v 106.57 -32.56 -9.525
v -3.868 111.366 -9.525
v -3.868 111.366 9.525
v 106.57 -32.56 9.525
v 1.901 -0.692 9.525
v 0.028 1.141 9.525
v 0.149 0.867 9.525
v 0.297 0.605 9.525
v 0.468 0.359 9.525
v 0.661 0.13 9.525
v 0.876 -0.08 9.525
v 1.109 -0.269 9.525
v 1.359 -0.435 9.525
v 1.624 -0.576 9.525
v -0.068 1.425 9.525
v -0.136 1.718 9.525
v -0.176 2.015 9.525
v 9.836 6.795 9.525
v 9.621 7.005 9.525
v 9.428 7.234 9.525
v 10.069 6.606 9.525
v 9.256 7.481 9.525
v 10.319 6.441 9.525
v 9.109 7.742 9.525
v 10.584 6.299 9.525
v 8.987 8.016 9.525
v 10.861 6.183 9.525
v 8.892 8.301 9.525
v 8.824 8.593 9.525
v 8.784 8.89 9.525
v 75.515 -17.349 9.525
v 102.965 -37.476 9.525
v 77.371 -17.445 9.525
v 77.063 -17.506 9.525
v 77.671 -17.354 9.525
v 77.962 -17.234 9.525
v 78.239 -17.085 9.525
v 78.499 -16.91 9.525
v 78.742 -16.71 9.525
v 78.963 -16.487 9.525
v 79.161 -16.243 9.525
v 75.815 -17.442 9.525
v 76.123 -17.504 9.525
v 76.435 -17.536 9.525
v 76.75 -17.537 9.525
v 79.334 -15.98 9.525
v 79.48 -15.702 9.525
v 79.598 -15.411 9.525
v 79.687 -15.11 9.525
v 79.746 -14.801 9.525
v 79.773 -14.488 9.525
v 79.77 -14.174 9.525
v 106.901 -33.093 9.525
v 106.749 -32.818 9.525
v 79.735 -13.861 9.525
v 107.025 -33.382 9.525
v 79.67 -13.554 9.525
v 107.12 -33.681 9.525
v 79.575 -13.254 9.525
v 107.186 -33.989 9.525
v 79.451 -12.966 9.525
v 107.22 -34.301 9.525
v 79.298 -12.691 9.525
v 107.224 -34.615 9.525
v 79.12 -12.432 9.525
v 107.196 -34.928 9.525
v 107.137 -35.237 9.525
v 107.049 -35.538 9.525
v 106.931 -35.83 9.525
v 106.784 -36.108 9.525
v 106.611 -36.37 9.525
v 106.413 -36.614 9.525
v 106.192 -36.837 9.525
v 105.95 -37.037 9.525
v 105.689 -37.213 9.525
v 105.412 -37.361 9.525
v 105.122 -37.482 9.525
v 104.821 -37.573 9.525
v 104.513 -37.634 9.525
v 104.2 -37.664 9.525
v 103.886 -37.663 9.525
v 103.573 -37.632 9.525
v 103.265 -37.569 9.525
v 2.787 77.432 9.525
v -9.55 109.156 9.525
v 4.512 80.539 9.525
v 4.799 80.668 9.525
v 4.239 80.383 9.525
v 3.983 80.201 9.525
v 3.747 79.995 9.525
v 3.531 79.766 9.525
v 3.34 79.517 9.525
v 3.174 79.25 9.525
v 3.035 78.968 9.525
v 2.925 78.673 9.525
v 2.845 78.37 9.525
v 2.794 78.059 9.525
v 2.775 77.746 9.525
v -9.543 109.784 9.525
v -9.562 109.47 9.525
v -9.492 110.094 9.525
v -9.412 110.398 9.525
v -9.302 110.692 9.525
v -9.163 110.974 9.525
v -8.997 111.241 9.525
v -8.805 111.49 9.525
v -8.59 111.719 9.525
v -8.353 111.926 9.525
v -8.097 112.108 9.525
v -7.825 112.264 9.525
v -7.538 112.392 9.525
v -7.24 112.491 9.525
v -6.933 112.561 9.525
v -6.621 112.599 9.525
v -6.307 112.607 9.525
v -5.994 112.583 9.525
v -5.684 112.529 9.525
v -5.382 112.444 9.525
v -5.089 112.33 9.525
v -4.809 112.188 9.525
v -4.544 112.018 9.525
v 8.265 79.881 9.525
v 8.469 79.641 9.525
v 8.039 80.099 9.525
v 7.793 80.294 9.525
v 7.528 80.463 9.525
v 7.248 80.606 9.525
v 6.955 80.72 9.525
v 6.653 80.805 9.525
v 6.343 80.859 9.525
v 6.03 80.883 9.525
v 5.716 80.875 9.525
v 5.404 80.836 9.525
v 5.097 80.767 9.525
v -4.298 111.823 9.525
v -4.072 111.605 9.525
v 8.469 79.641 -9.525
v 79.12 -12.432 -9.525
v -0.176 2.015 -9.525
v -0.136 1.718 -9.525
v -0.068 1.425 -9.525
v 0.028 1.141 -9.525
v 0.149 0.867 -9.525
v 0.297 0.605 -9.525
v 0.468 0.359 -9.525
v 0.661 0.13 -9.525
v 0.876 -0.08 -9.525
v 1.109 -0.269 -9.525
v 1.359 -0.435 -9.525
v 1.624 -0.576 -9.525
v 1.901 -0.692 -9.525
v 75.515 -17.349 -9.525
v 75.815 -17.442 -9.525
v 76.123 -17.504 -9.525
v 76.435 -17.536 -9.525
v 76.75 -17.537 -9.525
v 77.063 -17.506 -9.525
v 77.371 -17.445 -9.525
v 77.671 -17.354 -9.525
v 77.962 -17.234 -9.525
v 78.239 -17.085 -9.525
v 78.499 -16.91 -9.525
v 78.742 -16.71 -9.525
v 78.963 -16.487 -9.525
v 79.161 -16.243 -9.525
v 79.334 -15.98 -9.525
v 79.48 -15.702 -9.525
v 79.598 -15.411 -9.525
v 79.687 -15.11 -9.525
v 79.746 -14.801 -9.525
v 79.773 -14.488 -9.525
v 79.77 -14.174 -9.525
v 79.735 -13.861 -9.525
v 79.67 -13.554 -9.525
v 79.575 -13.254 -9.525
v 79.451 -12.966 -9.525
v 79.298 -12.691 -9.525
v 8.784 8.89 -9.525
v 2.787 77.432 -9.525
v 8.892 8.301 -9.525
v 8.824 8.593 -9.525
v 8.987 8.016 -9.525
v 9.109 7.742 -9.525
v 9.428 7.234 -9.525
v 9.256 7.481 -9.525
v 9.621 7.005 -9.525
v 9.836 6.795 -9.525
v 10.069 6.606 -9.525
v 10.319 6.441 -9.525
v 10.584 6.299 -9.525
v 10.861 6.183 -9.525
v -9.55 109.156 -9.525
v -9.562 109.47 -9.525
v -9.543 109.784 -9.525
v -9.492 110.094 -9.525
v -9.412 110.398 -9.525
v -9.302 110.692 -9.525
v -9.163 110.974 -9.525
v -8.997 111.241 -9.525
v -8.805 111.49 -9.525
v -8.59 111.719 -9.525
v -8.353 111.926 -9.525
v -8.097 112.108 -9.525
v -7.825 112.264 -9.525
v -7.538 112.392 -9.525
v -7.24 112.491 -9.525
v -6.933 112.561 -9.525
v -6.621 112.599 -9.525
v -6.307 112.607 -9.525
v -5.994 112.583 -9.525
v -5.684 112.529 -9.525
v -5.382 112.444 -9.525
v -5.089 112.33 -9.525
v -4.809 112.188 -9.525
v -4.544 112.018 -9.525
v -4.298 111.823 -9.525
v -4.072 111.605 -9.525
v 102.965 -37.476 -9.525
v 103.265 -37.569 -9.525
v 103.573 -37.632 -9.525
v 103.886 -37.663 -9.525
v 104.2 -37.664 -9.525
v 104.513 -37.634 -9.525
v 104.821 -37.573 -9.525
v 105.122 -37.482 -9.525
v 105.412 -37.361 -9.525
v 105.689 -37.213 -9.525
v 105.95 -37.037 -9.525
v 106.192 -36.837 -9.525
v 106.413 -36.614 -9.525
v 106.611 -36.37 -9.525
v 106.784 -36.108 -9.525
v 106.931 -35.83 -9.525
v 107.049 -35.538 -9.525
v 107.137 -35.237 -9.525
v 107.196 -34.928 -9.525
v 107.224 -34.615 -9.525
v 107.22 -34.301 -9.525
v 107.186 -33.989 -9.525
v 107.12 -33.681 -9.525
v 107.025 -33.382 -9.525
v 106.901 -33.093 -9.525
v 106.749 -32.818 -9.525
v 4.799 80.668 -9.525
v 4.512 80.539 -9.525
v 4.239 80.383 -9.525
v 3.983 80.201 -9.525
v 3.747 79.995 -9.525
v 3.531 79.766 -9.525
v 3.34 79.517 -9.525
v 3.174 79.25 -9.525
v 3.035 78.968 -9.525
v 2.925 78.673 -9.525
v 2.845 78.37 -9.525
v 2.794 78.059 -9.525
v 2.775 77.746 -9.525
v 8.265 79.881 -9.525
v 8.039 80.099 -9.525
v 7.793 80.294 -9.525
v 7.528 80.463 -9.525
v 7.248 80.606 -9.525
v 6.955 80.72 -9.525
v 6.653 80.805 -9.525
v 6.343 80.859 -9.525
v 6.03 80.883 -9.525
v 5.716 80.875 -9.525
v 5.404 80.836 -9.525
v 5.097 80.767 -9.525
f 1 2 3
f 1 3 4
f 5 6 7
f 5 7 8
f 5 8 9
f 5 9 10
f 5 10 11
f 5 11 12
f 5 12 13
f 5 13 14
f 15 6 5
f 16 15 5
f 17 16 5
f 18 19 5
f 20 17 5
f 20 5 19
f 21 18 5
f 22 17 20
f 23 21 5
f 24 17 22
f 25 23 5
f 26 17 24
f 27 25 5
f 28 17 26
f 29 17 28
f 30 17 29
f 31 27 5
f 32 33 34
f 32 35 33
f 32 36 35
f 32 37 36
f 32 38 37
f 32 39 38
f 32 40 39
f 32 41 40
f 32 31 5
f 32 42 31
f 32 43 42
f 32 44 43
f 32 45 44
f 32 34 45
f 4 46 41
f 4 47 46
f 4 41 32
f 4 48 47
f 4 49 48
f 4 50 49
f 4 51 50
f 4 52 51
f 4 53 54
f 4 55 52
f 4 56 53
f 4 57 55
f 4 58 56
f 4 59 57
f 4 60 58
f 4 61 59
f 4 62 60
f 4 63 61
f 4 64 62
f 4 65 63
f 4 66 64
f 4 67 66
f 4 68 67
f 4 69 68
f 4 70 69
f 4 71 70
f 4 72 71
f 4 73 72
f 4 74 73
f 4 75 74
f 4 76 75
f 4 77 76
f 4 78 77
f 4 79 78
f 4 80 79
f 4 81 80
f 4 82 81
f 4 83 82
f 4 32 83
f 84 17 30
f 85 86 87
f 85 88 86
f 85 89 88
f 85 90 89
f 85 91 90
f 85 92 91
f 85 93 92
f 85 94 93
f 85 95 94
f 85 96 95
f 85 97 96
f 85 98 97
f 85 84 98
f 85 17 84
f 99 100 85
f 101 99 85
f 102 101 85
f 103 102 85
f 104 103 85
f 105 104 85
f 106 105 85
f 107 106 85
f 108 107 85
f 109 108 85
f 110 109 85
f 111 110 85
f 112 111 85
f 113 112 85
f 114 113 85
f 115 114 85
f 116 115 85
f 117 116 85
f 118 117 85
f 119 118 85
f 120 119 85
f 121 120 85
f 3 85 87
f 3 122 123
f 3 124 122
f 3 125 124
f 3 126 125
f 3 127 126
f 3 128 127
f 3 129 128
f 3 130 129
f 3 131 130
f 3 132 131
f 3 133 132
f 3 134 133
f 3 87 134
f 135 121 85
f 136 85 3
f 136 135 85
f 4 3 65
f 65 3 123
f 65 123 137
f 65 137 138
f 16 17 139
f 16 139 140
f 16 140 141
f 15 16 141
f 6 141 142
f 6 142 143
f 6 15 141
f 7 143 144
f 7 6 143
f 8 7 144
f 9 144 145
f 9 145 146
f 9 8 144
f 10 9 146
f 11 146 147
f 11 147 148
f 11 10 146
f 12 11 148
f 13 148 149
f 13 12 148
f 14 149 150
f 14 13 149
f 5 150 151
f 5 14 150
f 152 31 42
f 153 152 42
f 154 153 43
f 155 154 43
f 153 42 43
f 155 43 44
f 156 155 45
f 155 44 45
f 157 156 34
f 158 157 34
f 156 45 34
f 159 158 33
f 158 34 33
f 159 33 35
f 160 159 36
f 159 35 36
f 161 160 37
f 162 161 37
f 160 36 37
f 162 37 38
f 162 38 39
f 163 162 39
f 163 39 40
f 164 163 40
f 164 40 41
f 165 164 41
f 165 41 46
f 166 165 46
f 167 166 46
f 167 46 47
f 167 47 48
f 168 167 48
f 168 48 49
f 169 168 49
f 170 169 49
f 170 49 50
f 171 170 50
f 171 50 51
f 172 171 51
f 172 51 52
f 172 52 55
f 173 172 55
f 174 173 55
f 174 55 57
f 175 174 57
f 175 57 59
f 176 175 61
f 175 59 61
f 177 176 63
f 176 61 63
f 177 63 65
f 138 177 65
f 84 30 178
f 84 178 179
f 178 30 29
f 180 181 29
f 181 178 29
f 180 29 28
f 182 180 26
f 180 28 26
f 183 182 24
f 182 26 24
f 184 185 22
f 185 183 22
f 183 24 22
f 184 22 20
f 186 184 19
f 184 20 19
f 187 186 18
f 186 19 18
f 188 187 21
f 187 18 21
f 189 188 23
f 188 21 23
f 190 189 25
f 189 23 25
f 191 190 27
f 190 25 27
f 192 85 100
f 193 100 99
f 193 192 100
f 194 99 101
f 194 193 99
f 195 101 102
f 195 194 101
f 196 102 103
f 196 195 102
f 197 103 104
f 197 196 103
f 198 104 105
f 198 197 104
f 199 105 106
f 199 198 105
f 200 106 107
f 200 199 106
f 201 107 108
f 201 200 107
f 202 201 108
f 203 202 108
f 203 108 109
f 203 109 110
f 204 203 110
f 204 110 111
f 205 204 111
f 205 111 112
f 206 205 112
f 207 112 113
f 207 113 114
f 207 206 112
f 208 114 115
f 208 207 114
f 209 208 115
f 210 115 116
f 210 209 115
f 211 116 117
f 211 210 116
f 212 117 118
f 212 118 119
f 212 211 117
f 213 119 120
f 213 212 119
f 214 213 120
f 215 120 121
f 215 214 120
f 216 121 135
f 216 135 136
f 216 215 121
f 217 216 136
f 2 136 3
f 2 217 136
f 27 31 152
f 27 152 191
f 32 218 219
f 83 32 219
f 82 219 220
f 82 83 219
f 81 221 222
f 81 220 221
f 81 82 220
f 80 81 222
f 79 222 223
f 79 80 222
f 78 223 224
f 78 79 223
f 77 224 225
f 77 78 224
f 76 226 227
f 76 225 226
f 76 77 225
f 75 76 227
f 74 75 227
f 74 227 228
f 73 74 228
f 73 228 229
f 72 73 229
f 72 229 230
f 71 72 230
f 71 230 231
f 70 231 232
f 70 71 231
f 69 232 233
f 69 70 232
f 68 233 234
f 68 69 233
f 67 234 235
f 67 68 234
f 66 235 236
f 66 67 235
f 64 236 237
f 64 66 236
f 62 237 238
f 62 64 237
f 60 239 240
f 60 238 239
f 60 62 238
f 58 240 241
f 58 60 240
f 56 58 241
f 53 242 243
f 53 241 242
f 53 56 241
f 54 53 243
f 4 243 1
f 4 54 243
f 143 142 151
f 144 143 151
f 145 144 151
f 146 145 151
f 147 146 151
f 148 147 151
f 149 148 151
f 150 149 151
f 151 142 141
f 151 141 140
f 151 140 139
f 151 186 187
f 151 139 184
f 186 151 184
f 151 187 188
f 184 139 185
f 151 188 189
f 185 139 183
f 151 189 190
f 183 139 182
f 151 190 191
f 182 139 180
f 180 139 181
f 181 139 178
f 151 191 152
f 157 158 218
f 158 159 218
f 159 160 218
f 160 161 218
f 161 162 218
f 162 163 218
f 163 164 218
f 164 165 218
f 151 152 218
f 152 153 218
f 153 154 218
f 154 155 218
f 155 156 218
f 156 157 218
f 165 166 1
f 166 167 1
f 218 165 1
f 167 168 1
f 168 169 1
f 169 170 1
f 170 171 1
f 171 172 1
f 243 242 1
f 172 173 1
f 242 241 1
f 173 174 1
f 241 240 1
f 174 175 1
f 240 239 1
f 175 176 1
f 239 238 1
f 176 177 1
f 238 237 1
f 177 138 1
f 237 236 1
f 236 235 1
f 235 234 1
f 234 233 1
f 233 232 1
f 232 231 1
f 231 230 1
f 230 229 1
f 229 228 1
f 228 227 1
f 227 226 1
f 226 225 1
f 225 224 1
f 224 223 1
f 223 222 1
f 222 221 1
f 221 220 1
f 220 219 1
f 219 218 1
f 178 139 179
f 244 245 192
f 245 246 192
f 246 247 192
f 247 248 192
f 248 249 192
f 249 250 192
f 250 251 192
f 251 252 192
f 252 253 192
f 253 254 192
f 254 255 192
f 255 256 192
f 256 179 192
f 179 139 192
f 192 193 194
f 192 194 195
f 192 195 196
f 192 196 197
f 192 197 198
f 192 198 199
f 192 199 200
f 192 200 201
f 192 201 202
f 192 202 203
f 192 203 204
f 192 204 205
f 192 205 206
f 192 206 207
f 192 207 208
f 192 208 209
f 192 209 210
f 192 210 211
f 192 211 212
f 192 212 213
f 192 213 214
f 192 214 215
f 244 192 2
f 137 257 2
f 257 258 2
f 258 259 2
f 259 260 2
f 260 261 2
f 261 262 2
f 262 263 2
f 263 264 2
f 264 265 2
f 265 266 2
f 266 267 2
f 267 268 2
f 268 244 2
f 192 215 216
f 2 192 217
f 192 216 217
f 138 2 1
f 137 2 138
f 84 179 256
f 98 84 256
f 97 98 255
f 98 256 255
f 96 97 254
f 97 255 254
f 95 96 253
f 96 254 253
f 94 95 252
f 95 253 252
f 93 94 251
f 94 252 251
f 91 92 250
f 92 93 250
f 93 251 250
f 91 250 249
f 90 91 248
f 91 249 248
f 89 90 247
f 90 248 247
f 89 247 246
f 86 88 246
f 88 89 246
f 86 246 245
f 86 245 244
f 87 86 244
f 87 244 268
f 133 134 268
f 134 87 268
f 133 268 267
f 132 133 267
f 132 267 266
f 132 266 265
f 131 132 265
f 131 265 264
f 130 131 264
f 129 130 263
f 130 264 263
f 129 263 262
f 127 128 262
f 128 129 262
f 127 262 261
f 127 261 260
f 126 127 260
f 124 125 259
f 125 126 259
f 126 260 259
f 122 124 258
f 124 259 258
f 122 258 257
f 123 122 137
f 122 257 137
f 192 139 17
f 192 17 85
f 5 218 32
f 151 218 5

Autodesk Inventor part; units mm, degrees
ref_plane "YZ Plane" through (0, 0, 0) normal (1, 0, 0) x (0, 1, 0)
ref_plane "XZ Plane" through (0, 0, 0) normal (0, 1, 0) x (-1, 0, 0)
ref_plane "XY Plane" through (0, 0, 0) normal (0, 0, 1) x (1, 0, 0)
sketch "Sketch1" plane through (0, 0, 0) normal (0, 0, 1) x (1, 0, 0)
  line L0 (0, 0) -> (-10.4993, 120.0076)
  line L1 (-10.4993, 120.0076) -> (113.201, -41.2018)
  line L2 (113.201, -41.2018) -> (0, 0)
  dimension "d23" = 115
  dimension "d24" = 203.2
  dimension "d31" = 32.5
extrude "Extrusion1" add sketch "Sketch1" along normal mid plane 19.05
sketch "Sketch2" plane through (0, 0, 0) normal (0, 0, 1) x (1, 0, 0)
  line L0 (8.9599, 6.8752) -> (1.8376, 88.2833)
  line L1 (1.8376, 88.2833) -> (85.7507, -21.0744)
  line L2 (85.7507, -21.0744) -> (8.9599, 6.8752)
  line L3 (0, 0) -> (-10.4993, 120.0076) projected
  line L4 (-10.4993, 120.0076) -> (113.201, -41.2018) projected
  line L5 (113.201, -41.2018) -> (0, 0) projected
  dimension "d4" = 9.525
  dimension "d5" = 9.525
  dimension "d6" = 9.525
extrude "Extrusion2" cut sketch "Sketch2" against normal through all both and the other way through all contours L0 L1 L2
fillet "Fillet1" radius 3.175 3 edges at (-10.4993, 120.0076, 0) (0, 0, 0) (113.201, -41.2018, 0)
fillet "Fillet2" radius 3.175 3 edges at (1.8376, 88.2833, 0) (8.9599, 6.8752, 0) (85.7507, -21.0744, 0)
equation "\"d23\" = longAngle"
equation "\"d24\" = maxLength"
equation "\"d31\" = basicAngle"
equation "\"d2\" = width"
equation "\"d4\" = wallThickness"
equation "\"d5\" = wallThickness"
equation "\"d6\" = wallThickness"
equation "\"d32\" = fillet"
equation "\"d33\" = fillet"
equation "\"maxLength\" = 203.2"
equation "\"width\" = 19.05"
equation "\"wallThickness\" = 9.525"
equation "\"longAngle\" = 115deg"
equation "\"fillet\" = 3.175"
equation "\"basicAngle\" = 32.5deg"
properties part number "stopForSaltChute"
